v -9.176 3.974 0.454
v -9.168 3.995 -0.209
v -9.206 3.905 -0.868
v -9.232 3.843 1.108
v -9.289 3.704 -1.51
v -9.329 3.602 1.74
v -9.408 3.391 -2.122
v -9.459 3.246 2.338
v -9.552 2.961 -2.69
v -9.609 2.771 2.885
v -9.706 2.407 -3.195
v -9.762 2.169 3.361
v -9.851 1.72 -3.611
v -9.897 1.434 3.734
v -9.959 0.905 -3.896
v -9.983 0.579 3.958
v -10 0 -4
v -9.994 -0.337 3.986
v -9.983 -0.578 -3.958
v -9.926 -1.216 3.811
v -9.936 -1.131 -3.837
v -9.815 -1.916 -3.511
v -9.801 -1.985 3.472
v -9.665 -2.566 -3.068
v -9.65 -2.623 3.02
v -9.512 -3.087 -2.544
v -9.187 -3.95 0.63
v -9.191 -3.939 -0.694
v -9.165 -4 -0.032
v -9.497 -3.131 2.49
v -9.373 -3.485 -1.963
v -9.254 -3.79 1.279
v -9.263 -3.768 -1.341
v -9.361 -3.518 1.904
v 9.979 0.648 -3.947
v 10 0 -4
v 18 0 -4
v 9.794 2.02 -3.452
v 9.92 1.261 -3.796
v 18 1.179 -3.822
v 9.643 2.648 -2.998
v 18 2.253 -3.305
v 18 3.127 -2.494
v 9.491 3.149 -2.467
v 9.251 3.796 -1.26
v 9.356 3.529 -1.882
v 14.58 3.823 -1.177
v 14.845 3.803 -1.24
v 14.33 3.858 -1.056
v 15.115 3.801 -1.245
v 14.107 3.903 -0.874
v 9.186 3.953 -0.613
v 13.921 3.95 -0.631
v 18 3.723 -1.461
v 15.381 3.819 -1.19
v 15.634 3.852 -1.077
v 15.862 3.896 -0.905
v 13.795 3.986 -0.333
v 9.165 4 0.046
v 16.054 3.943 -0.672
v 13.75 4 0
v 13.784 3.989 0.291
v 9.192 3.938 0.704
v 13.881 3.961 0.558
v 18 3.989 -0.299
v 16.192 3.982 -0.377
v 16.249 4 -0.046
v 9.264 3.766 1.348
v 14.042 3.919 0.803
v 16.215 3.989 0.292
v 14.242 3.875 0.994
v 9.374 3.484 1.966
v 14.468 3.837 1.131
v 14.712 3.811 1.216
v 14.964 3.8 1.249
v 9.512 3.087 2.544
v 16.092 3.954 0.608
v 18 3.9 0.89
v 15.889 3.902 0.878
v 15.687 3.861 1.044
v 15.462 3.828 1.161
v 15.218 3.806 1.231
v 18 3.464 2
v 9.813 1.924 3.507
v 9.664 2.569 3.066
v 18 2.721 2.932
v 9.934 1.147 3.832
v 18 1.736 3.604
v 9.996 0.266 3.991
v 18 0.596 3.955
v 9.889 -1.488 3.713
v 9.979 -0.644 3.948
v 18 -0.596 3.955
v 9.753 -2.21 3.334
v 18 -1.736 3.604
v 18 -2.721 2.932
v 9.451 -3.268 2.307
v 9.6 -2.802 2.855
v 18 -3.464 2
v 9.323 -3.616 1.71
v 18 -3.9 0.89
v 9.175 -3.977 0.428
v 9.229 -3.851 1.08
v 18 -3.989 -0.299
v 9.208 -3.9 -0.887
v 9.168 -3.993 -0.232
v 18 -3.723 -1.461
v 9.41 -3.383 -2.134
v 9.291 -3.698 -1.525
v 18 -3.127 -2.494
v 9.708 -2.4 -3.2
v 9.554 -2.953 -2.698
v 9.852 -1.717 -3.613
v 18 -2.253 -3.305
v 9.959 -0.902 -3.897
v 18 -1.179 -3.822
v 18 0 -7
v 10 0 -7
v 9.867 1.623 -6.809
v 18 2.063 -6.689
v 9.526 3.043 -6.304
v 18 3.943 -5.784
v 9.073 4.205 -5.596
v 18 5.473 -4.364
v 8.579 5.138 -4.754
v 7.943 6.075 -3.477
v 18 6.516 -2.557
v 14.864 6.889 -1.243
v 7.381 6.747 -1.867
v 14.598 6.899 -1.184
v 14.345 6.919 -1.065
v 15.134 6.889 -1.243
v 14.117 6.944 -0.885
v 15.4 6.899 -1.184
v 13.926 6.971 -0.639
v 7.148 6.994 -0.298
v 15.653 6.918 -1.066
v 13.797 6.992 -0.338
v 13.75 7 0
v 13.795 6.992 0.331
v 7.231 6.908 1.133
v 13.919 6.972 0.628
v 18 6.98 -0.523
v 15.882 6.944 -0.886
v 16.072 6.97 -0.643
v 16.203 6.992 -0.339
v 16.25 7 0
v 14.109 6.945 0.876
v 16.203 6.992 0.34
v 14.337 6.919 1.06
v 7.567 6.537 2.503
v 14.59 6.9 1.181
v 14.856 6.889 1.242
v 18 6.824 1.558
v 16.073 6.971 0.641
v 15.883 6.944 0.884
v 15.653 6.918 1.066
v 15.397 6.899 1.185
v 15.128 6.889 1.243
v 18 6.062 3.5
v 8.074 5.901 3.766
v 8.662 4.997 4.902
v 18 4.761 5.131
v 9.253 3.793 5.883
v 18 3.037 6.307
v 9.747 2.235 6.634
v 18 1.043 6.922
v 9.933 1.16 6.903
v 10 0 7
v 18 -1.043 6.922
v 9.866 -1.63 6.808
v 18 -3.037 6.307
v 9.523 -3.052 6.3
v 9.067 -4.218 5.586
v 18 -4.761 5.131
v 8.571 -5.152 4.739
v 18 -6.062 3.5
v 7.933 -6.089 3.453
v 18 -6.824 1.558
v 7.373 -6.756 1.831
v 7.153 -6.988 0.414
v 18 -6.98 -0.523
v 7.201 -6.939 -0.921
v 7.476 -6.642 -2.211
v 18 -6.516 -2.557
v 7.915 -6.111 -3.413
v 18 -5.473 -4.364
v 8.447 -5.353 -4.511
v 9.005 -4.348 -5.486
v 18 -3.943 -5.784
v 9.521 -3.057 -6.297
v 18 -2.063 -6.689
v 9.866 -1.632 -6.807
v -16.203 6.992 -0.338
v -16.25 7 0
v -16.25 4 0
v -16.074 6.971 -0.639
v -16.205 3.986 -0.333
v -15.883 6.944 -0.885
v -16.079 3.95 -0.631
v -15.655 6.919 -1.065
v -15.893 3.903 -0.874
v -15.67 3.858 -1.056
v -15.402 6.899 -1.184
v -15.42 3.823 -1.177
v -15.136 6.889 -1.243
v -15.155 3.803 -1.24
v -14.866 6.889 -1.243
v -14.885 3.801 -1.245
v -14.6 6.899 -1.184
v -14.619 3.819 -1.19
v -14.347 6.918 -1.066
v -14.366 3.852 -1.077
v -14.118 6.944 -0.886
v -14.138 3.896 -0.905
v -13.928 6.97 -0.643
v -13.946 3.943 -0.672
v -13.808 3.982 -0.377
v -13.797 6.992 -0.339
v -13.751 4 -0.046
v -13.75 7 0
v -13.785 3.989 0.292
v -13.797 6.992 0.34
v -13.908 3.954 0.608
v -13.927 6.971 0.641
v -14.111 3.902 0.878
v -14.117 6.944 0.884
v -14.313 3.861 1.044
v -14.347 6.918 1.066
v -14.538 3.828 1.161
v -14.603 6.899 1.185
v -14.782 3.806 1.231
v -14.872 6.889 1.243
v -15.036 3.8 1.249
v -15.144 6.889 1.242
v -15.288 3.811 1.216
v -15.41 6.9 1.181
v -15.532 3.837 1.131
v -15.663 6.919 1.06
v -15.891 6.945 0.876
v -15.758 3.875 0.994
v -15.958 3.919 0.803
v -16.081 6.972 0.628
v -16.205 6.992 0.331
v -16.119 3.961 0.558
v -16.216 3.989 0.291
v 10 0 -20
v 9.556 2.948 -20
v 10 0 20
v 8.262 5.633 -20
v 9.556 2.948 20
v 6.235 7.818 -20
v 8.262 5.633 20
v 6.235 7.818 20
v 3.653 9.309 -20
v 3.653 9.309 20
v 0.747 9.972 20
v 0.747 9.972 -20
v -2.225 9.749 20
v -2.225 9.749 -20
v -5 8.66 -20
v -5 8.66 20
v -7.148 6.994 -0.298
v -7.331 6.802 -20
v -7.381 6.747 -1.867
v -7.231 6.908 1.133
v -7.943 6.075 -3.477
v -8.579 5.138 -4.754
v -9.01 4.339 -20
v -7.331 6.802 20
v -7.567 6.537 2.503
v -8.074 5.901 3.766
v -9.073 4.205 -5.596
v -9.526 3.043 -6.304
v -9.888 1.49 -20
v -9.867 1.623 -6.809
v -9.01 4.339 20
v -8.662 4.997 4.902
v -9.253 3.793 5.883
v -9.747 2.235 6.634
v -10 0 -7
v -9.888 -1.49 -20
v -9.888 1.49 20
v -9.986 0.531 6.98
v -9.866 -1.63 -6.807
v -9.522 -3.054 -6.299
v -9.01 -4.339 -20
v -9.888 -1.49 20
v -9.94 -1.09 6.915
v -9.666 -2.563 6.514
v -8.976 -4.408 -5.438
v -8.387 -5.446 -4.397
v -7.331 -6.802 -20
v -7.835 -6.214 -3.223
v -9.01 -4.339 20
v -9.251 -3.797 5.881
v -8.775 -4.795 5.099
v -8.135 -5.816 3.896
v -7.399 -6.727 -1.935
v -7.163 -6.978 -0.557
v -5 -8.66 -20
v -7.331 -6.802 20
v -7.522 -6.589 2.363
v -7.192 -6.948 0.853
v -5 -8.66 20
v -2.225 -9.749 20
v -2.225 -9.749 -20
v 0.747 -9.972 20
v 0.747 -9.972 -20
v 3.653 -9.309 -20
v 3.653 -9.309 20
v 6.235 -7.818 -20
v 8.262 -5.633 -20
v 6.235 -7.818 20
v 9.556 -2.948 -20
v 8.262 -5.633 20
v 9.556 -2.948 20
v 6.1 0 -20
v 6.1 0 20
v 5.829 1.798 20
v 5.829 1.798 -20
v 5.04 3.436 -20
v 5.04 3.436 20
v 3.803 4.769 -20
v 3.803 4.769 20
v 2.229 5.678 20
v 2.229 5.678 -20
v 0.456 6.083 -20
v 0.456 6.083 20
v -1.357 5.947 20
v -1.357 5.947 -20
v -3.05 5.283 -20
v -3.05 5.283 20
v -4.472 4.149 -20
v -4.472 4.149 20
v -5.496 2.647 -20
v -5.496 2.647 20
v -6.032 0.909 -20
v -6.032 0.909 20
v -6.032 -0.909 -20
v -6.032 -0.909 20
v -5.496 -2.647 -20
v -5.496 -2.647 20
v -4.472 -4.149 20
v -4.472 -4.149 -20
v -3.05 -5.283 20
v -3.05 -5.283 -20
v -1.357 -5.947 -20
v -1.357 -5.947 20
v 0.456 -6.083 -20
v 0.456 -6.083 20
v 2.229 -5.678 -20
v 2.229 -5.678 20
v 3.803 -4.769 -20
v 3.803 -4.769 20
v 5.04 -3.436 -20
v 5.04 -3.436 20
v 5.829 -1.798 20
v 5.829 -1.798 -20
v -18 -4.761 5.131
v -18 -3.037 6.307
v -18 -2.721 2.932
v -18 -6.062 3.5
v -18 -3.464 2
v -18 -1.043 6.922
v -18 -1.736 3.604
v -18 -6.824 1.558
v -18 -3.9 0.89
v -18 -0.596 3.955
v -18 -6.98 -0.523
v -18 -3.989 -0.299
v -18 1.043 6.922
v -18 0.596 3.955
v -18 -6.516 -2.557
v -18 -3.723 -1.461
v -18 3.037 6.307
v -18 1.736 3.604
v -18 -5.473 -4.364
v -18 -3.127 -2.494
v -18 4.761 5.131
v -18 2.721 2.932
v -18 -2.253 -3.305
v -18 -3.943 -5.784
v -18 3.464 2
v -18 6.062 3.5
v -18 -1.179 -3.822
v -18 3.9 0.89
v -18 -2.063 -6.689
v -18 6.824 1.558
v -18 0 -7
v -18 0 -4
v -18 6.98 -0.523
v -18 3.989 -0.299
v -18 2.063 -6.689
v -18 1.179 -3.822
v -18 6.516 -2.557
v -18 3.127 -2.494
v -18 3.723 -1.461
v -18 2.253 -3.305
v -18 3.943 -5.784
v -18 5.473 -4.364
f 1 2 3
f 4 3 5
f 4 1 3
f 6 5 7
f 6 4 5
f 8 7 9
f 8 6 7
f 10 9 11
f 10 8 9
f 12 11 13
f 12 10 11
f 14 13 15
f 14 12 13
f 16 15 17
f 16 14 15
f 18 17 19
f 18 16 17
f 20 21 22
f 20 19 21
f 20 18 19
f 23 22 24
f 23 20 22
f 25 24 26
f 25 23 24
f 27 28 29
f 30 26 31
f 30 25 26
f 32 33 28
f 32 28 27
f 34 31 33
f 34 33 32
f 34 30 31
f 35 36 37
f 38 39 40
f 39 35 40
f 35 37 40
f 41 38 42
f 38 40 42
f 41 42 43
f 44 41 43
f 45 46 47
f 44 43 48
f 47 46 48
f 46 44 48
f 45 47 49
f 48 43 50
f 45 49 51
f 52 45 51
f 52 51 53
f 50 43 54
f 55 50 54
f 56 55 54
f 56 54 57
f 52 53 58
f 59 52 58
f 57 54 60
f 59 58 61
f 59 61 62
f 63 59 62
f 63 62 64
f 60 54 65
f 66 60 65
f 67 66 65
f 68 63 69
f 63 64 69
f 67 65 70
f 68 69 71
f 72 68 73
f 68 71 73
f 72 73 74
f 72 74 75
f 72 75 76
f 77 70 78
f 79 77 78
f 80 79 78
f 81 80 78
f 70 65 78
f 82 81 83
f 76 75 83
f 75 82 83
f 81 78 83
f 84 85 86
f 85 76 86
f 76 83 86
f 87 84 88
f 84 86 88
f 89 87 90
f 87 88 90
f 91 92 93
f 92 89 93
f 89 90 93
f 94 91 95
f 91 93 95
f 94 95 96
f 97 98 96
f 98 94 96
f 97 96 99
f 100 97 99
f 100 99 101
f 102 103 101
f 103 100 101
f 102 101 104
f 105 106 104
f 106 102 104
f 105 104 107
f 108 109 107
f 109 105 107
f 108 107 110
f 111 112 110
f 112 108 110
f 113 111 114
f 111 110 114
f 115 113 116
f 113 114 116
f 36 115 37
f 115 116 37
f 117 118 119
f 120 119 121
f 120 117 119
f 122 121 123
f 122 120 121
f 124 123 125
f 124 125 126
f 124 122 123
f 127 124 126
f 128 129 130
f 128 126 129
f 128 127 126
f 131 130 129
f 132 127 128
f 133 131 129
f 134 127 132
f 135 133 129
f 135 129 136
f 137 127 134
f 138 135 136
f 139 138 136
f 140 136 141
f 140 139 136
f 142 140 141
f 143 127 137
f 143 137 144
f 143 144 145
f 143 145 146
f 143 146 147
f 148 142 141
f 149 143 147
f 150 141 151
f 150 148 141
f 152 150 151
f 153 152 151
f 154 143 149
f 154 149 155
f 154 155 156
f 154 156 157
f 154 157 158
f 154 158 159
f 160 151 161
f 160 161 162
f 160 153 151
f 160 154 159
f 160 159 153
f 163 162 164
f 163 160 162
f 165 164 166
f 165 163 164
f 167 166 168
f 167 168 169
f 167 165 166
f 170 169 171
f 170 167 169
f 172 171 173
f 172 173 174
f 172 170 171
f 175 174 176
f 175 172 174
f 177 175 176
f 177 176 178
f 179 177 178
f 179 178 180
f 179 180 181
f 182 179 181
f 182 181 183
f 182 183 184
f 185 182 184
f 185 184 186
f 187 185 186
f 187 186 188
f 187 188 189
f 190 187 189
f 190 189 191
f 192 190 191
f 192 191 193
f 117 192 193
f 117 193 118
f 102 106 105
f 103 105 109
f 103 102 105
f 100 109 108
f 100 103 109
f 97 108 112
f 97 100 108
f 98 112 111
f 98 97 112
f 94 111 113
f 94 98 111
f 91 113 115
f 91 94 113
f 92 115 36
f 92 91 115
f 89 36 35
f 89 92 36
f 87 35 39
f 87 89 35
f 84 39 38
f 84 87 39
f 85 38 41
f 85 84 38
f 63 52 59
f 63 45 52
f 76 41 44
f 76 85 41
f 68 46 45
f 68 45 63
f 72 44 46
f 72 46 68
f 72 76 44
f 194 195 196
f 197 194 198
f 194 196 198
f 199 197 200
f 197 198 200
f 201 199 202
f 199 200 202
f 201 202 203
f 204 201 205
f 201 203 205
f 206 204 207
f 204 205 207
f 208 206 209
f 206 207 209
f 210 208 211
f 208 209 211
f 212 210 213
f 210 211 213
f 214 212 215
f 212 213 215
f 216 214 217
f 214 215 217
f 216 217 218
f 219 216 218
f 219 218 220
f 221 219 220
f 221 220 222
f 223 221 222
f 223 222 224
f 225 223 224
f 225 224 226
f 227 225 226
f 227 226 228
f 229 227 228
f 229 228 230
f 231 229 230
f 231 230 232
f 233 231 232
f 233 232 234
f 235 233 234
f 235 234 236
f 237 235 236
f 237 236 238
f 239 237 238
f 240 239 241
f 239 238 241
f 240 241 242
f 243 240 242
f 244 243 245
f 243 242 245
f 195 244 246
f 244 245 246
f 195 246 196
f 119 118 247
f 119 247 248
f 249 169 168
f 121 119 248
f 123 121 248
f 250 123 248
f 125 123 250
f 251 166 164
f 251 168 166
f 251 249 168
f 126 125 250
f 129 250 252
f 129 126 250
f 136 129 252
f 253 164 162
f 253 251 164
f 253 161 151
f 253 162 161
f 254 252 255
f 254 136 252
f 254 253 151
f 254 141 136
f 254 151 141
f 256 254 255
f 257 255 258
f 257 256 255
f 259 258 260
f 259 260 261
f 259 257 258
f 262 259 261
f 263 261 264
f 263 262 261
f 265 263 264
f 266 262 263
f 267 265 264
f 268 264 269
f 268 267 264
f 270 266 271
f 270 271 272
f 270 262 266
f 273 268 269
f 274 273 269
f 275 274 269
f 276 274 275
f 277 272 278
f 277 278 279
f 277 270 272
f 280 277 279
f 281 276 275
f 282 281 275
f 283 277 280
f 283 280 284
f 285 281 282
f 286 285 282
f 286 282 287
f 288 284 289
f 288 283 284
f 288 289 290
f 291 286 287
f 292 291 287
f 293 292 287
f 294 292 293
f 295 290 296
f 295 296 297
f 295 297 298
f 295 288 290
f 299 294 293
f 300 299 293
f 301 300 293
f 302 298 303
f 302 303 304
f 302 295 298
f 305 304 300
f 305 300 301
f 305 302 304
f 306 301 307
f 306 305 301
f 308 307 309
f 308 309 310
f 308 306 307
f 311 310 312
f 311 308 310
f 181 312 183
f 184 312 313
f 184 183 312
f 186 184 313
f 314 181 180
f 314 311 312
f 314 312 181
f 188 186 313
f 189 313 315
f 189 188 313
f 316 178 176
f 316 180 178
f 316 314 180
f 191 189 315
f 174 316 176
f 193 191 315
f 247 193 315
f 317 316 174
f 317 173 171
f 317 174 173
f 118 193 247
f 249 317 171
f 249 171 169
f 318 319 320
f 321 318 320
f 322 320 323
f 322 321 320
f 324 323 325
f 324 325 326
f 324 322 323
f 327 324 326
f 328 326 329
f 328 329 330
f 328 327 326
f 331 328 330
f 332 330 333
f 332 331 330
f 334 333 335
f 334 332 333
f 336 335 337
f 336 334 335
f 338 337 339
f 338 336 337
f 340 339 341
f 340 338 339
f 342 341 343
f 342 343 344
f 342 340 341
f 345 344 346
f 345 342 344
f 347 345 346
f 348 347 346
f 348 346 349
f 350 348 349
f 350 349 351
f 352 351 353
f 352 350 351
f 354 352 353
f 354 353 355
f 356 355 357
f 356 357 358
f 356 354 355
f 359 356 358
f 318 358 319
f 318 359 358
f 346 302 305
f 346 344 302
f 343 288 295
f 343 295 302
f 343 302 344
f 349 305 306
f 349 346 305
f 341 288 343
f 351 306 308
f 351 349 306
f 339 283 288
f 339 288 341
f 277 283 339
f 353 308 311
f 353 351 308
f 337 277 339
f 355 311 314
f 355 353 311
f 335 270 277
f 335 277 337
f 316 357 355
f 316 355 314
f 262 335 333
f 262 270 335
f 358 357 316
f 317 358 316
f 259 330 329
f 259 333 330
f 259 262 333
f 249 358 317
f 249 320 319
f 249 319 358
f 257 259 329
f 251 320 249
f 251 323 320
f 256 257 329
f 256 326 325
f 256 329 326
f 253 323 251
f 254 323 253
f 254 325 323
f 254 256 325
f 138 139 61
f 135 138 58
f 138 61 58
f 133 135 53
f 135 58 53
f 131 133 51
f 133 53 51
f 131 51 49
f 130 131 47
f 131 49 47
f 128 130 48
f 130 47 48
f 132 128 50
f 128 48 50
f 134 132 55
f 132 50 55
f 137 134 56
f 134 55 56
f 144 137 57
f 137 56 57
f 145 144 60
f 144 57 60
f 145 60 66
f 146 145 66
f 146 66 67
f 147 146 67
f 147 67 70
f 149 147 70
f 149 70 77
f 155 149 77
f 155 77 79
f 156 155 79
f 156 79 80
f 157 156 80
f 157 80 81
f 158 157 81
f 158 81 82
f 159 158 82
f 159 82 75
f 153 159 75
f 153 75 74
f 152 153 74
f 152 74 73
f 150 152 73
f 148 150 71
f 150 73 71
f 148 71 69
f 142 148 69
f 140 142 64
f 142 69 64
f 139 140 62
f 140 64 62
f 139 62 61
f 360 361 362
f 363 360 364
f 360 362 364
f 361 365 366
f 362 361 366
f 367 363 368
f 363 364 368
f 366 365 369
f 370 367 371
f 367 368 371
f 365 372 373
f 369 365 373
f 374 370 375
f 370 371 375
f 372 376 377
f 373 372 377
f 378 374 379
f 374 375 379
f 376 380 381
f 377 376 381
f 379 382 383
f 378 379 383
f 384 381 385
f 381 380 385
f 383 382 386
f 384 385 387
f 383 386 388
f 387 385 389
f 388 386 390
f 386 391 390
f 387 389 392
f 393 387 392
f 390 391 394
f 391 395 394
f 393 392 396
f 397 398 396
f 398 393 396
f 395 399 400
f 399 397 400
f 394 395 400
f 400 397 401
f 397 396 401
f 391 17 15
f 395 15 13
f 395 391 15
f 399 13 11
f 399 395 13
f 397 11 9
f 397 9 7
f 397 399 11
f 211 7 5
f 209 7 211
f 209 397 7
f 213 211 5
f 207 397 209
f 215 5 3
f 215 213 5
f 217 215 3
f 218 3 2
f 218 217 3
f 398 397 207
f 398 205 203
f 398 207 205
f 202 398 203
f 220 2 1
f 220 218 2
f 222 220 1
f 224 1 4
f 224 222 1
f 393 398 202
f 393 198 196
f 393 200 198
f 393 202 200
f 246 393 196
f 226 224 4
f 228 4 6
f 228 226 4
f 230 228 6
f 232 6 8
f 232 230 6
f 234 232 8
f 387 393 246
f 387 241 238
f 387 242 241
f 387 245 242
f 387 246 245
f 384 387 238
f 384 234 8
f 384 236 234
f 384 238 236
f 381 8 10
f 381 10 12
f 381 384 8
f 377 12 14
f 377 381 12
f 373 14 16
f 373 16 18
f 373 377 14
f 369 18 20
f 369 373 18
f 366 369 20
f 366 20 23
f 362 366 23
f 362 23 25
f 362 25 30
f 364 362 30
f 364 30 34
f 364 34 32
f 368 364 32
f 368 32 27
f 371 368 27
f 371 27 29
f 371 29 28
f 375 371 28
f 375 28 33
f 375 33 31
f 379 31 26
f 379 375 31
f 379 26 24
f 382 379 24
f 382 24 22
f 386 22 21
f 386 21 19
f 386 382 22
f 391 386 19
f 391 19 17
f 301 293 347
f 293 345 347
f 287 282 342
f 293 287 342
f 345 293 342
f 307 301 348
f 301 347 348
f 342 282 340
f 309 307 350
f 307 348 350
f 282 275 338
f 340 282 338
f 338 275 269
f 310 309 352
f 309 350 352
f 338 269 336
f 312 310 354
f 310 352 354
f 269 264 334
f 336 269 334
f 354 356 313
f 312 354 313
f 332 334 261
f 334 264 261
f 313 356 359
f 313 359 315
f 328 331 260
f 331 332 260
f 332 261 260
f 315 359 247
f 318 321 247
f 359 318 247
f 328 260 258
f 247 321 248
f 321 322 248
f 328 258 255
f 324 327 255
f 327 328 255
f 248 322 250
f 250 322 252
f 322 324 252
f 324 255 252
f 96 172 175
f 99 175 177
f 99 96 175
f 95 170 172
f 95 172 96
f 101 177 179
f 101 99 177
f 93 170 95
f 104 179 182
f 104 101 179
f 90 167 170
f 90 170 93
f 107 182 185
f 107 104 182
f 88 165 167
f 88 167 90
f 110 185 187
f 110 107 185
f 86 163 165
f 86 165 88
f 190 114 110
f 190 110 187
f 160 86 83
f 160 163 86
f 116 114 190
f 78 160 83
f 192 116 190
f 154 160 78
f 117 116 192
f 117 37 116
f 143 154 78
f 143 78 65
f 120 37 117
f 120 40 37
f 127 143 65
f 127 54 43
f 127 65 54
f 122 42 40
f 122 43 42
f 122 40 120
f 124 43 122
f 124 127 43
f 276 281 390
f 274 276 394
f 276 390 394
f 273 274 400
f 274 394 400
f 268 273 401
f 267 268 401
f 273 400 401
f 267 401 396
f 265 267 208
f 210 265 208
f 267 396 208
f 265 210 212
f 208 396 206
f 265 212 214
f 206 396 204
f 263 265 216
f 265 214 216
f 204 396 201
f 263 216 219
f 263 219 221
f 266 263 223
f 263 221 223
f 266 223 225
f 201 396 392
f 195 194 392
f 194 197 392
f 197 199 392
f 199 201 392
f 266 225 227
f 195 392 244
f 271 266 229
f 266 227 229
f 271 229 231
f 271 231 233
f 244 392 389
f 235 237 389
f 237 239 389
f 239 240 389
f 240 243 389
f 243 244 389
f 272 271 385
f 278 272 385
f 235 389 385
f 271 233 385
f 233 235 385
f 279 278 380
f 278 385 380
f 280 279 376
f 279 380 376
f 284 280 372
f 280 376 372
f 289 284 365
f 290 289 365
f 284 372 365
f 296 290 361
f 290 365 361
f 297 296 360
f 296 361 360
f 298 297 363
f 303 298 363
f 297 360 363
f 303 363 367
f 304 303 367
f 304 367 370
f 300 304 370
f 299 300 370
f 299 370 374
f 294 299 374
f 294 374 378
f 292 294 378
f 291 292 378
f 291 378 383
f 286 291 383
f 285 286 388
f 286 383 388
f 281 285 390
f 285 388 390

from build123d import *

# Parameters (mm, degrees)
SKETCH1_R                = 10
SKETCH1_R_2              = 6.1
BOSS_EXTRUDE1_DEPTH      = 20
BOSS_EXTRUDE2_REACH      = 37.833
BOSS_EXTRUDE2_END_RADIUS = 10
SKETCH3_R                = 7
SKETCH3_R_2              = 4
M3_TAPPED_HOLE2_D        = 2.5
M3_TAPPED_HOLE2_DEPTH    = 8.5
M3_TAPPED_HOLE2_TIP      = 0.751075774


with BuildPart() as part:
    # Sketch1 → Boss-Extrude1 (new, symmetric)
    with BuildSketch(Plane.XY):
        Circle(SKETCH1_R)
        Circle(SKETCH1_R_2, mode=Mode.SUBTRACT)
    extrude(amount=BOSS_EXTRUDE1_DEPTH, both=True)

    # Boss-Extrude2: up to this cylinder (the profile starts outside it)
    boss_extrude2_end = Plane(origin=(0, 0, 6.80201), z_dir=(0, 0, -1)) * Cylinder(BOSS_EXTRUDE2_END_RADIUS, 96.666, mode=Mode.PRIVATE)
    # Sketch3 → Boss-Extrude2 (add, up to the surface)
    with BuildSketch(Plane(origin=(18, 0, 0), x_dir=(0, 0, -1), z_dir=(1, 0, 0)), mode=Mode.PRIVATE) as boss_extrude2_sk1:
        Circle(SKETCH3_R)
        Circle(SKETCH3_R_2, mode=Mode.SUBTRACT)
    boss_extrude2_tool1 = extrude(boss_extrude2_sk1.sketch, amount=-BOSS_EXTRUDE2_REACH, mode=Mode.PRIVATE) - boss_extrude2_end
    boss_extrude2 = boss_extrude2_tool1.solids().sort_by_distance((18, 0, 6.80201))[0]
    add(boss_extrude2)

    # Mirror2: Boss-Extrude2 across plane
    add(boss_extrude2.mirror(Plane(origin=(0, 0, 0), x_dir=(0, 0, 1), z_dir=(1, 0, 0))))

    # M3 Tapped Hole2
    with Locations(Plane(origin=(0, 7, 0), x_dir=(1, 0, 0), z_dir=(0, 1, 0))):
        with Locations((-15, 0), (15, 0)):
            Hole(M3_TAPPED_HOLE2_D / 2, depth=M3_TAPPED_HOLE2_DEPTH)
            with Locations((0, 0, -(M3_TAPPED_HOLE2_DEPTH + M3_TAPPED_HOLE2_TIP / 2))):  # 118° drill point
                Cone(0, M3_TAPPED_HOLE2_D / 2, M3_TAPPED_HOLE2_TIP, mode=Mode.SUBTRACT)


solid = part.part
